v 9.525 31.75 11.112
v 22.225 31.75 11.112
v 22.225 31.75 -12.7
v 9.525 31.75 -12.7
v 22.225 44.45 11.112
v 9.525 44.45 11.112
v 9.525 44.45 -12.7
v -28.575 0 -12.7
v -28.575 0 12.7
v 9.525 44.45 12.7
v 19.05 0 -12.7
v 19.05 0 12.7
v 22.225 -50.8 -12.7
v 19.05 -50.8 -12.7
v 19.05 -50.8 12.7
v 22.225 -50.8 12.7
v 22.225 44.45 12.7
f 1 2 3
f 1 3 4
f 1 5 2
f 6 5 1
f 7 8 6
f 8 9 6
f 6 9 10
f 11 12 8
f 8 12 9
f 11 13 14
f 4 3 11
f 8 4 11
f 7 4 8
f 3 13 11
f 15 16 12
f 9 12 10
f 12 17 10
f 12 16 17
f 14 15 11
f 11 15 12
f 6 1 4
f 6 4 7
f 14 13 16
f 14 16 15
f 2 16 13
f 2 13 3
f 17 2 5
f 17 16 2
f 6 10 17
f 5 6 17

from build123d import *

# Parameters (mm, degrees)
BOSS_EXTRUDE1_DEPTH = 12.7
SKETCH2_W           = 12.7
SKETCH2_H           = 12.7
CUT_EXTRUDE1_DEPTH  = 23.8125


with BuildPart() as part:
    # Sketch1 → Boss-Extrude1 (new, symmetric)
    with BuildSketch(Plane.XY):
        Polygon((19.05, -50.8), (19.05, 0), (-28.575, 0), (9.525, 44.45), (22.225, 44.45), (22.225, 31.75), (22.225, -50.8), align=None)
    extrude(amount=BOSS_EXTRUDE1_DEPTH, both=True)

    # Sketch2 → Cut-Extrude1 (cut)
    with BuildSketch(Plane(origin=(0, 0, -12.7), x_dir=(-1, 0, 0), z_dir=(0, 0, -1))):
        with Locations((-15.875, 38.1)):
            Rectangle(SKETCH2_W, SKETCH2_H)
    extrude(amount=-CUT_EXTRUDE1_DEPTH, mode=Mode.SUBTRACT)


solid = part.part
